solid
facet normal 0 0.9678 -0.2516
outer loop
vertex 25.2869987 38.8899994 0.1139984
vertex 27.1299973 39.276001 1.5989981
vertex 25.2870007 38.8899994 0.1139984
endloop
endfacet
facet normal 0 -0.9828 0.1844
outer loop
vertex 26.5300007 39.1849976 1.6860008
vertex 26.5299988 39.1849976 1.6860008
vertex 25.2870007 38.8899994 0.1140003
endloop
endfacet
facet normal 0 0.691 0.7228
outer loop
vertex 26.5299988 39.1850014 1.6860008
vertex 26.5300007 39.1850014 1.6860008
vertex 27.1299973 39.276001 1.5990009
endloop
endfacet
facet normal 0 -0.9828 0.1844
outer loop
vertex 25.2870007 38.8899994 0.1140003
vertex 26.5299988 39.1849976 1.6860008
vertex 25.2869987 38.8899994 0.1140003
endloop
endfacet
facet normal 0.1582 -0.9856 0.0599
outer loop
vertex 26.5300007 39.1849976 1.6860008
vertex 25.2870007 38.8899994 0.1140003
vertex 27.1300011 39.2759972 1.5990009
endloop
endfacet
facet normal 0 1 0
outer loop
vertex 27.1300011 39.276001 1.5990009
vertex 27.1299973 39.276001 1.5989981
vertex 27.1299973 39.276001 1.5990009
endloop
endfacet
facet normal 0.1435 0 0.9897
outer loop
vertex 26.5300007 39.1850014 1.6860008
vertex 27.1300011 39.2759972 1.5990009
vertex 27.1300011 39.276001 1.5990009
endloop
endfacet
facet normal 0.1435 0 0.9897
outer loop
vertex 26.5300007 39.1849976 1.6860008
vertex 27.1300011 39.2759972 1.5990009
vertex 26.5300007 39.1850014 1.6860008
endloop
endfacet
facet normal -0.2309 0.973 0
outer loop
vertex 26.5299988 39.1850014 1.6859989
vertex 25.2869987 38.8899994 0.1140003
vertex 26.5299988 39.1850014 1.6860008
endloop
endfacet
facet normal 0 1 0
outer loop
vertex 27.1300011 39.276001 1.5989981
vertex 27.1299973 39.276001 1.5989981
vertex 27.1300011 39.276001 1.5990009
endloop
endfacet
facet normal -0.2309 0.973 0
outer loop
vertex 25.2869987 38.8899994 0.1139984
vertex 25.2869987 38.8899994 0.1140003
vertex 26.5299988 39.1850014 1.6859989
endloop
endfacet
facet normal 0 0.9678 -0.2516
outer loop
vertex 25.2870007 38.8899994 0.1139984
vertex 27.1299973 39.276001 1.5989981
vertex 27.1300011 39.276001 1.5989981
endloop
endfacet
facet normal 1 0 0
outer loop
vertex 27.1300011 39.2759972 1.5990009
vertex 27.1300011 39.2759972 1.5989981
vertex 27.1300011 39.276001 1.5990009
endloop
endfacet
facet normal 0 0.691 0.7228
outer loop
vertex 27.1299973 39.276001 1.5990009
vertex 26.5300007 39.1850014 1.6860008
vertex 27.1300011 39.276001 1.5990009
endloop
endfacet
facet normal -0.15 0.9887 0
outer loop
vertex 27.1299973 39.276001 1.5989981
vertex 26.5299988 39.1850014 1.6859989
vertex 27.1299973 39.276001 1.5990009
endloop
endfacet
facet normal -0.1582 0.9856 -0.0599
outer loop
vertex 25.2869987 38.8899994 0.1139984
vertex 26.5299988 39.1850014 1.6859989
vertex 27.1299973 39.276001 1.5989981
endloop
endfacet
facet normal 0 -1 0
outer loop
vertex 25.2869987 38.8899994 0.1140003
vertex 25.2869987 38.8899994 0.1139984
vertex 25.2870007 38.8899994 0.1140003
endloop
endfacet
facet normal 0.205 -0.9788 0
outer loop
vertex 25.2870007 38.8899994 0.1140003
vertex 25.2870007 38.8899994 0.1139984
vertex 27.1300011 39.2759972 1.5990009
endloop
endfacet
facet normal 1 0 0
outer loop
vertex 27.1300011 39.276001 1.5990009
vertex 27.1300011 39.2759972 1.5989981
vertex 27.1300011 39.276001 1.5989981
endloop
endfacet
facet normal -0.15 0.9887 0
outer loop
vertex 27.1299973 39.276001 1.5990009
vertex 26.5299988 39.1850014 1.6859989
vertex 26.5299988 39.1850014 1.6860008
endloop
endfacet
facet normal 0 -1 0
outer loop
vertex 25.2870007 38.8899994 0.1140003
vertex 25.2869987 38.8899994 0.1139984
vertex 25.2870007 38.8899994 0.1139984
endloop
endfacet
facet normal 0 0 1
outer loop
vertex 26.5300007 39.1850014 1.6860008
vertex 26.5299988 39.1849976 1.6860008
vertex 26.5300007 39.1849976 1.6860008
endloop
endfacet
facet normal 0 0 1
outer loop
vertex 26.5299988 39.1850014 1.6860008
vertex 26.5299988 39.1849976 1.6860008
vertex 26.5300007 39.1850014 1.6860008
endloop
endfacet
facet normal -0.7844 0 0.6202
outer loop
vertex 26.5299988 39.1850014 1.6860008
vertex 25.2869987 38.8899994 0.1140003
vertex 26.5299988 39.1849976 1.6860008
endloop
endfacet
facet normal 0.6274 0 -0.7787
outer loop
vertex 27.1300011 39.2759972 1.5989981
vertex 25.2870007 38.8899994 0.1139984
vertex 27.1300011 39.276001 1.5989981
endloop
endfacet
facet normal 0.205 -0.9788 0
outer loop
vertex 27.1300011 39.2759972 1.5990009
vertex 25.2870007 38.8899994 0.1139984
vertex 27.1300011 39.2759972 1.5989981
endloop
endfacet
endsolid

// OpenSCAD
/*
hull()
    for(p=[[2,2,2], [2,8,8], [7,2,2]])
        translate(p) cube(0.000002, true);
*/

hull()
    for(p=[[25.287, 38.89, 0.114], [26.53, 39.185, 1.686], [27.13, 39.276, 1.599]])
        translate(p) cube(0.000002, true);
